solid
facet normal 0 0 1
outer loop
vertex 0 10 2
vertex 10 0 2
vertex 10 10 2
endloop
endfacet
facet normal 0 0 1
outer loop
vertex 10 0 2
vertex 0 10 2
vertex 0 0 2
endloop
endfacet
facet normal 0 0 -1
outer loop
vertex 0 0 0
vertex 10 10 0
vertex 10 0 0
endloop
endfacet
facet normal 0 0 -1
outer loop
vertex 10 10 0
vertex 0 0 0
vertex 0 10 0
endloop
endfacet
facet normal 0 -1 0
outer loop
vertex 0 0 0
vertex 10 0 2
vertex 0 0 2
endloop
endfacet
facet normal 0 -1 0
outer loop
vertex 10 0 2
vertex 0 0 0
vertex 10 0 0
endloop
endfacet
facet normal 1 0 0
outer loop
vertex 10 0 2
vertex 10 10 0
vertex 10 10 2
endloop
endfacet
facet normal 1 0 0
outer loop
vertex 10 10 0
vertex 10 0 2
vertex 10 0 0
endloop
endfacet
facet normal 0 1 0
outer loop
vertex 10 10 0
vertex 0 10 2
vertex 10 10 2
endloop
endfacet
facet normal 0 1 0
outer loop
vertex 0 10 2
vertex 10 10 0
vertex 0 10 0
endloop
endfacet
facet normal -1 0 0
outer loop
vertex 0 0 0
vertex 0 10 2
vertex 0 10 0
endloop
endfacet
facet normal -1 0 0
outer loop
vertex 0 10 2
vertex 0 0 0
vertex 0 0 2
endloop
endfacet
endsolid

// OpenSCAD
module print_surface(
x = 10,
y = 10,
plate_thickness = 2
) {
	cube(size = [x, y, plate_thickness], center = false);
}

print_surface();
